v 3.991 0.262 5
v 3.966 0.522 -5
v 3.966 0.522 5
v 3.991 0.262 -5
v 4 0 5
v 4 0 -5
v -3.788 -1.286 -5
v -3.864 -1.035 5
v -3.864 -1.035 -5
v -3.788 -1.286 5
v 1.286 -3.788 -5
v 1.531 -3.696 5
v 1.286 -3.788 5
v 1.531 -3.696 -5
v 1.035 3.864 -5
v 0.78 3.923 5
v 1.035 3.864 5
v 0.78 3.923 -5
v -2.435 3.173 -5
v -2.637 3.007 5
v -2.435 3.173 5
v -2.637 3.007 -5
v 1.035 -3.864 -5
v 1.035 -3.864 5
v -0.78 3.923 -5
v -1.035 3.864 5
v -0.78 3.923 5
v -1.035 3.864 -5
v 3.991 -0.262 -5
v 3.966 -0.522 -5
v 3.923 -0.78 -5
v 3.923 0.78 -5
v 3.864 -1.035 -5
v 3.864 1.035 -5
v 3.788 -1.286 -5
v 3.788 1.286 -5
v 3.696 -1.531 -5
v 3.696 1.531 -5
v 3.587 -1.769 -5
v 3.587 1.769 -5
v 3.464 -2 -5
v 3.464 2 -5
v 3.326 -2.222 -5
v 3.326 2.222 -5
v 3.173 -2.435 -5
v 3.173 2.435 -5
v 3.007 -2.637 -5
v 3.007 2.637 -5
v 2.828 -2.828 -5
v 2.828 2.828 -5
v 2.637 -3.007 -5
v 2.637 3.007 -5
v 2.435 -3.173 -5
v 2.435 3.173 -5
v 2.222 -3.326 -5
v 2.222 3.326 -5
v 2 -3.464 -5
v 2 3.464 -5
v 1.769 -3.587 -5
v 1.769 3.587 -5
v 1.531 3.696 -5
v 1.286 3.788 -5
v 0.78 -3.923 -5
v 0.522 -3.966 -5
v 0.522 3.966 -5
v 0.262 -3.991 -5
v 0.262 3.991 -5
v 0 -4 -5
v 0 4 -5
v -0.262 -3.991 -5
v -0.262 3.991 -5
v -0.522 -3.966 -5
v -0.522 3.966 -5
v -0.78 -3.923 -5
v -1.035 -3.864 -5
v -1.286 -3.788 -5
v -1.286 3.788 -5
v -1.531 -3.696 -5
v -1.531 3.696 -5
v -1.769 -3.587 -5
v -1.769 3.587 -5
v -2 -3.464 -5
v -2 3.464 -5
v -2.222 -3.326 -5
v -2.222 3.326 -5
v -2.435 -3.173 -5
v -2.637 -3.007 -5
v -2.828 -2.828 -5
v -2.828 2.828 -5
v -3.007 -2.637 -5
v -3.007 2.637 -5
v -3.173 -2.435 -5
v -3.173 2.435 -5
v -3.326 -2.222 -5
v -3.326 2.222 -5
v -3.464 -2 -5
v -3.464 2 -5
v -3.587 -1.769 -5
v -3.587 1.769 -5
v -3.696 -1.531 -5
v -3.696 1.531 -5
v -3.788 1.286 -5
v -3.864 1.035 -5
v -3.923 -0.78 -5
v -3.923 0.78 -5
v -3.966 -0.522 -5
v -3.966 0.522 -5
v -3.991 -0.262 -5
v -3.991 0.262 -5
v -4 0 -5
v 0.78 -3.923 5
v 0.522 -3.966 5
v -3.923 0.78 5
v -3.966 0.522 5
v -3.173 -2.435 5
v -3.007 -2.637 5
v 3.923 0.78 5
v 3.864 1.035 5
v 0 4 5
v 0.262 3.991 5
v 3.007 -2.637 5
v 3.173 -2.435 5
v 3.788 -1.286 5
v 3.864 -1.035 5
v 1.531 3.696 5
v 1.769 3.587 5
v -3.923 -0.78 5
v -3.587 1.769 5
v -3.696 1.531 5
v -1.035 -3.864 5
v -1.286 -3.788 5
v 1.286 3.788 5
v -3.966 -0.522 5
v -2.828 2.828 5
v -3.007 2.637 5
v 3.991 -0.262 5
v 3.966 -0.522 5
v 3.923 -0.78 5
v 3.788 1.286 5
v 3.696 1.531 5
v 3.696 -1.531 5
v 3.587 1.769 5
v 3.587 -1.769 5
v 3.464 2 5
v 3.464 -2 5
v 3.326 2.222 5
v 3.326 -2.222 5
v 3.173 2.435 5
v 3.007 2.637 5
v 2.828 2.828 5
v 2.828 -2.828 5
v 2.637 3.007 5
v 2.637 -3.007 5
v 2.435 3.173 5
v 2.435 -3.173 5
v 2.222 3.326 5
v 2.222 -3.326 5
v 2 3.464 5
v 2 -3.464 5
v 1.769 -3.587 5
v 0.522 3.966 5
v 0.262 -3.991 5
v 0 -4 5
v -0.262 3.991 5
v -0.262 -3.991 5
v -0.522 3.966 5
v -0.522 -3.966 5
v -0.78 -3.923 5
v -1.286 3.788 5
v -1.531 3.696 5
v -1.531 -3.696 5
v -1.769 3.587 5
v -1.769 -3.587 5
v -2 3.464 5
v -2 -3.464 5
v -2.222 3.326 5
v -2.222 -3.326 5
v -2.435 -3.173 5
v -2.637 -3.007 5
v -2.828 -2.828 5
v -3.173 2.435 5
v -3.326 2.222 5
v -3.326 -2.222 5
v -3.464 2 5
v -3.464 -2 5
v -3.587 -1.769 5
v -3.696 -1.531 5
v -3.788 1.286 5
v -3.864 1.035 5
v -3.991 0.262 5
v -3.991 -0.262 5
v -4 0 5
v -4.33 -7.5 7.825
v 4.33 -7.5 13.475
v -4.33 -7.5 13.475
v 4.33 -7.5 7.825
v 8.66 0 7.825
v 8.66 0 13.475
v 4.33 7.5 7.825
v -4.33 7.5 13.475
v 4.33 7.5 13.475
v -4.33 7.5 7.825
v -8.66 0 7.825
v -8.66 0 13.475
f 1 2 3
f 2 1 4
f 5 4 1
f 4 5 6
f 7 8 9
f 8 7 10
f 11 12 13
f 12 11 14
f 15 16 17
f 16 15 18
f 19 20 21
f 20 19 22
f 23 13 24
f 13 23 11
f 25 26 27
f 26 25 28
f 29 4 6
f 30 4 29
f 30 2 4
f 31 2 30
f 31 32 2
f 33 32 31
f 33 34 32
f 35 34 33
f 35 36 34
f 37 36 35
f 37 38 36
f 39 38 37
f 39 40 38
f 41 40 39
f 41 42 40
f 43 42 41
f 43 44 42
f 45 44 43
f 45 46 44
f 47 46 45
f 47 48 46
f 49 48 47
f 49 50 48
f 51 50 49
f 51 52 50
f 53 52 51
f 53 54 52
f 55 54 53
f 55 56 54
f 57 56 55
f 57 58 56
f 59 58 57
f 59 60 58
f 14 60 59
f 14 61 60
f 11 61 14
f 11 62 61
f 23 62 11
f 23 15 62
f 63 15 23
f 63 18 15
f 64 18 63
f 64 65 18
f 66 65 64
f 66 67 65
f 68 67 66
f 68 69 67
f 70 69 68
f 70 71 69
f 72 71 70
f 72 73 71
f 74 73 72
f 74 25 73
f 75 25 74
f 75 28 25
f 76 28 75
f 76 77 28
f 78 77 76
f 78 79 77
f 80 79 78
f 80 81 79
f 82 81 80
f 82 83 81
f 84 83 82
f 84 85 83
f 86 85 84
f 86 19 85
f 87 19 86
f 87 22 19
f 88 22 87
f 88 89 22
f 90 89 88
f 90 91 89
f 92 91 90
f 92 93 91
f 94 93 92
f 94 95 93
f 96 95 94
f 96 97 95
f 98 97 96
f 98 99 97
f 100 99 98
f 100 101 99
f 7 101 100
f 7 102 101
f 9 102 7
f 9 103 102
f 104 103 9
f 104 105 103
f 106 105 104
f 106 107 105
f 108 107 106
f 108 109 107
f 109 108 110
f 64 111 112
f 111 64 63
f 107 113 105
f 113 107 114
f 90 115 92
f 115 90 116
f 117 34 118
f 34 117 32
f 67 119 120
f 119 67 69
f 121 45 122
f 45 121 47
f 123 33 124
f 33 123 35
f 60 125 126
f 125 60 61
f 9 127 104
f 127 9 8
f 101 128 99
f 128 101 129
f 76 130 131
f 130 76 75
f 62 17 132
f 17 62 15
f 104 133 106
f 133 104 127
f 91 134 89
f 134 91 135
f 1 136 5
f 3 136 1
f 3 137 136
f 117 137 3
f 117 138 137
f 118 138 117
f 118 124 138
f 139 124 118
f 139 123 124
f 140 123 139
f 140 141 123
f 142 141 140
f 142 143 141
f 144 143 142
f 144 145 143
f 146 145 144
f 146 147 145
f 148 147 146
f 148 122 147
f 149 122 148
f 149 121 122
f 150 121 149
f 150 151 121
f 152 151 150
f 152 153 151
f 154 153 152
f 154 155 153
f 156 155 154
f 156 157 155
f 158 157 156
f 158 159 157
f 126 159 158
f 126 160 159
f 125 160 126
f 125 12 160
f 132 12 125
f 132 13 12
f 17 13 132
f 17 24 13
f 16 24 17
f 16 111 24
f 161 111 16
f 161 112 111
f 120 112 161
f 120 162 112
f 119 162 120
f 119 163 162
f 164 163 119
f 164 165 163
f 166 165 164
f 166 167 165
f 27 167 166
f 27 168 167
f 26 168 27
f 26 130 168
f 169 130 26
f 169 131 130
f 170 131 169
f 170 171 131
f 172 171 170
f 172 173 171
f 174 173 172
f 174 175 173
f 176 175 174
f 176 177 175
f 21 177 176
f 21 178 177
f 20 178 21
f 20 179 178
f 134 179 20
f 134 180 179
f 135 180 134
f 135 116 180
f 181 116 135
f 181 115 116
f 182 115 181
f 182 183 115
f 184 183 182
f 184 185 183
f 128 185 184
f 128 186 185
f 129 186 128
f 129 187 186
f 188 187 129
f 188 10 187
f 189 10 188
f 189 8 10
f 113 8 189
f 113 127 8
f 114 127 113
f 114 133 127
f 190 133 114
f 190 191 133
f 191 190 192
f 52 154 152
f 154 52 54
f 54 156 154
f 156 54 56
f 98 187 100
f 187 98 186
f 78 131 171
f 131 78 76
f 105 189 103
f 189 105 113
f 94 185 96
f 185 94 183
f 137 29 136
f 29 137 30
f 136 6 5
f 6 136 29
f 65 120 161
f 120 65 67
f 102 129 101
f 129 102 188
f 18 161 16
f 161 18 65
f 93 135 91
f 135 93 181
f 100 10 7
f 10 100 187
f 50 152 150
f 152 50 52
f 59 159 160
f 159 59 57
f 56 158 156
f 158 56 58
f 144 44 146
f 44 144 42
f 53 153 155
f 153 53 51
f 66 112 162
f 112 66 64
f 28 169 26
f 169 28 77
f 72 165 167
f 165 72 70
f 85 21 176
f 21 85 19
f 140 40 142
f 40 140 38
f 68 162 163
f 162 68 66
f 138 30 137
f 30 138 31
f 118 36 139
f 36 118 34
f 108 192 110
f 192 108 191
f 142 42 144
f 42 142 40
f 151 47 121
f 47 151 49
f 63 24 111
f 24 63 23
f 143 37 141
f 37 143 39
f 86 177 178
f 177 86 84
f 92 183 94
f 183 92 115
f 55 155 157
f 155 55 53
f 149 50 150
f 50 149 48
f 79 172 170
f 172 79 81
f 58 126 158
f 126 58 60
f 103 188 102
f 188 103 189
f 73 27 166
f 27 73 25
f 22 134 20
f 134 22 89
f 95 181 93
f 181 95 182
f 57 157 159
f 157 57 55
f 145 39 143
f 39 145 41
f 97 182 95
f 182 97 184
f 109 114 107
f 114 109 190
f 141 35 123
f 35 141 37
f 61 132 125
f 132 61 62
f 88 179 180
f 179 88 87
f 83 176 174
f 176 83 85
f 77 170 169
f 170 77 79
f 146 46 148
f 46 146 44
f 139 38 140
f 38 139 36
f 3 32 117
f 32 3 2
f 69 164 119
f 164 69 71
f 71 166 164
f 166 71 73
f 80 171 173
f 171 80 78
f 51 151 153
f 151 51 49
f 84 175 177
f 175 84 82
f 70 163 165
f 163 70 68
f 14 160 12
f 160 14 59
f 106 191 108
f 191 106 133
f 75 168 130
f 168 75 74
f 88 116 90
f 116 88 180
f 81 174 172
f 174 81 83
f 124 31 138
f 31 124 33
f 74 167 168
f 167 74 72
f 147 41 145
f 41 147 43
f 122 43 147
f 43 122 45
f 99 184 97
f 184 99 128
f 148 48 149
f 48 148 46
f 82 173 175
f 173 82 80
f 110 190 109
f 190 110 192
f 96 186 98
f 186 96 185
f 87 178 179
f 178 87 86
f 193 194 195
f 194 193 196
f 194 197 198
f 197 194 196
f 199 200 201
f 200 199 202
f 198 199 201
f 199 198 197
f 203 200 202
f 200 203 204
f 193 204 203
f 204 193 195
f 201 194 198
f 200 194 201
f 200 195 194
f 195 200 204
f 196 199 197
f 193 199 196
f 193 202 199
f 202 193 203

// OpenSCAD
$fn=96;

module hex_prism(flat_d, h){
    r = flat_d / sqrt(3);
    cylinder(h=h, r=r, $fn=6);
}

module screw_shank(d=8.0, L=10.0){
    translate([0,0,-L/2])
        cylinder(h=L, d=d, $fn=96);
}

module screw_head(hex_flat_d=15.0, head_h=5.65){
    translate([0,0,head_h/2])
        hex_prism(hex_flat_d, head_h);
}

module hex_head_screw(shank_d=8.0, shank_L=10.0, head_flat_d=15.0, head_h=5.65){
    union(){
        screw_shank(shank_d, shank_L);
        translate([0,0,shank_L/2])
            screw_head(head_flat_d, head_h);
    }
}

hex_head_screw(8.0, 10.0, 15.0, 5.65);
